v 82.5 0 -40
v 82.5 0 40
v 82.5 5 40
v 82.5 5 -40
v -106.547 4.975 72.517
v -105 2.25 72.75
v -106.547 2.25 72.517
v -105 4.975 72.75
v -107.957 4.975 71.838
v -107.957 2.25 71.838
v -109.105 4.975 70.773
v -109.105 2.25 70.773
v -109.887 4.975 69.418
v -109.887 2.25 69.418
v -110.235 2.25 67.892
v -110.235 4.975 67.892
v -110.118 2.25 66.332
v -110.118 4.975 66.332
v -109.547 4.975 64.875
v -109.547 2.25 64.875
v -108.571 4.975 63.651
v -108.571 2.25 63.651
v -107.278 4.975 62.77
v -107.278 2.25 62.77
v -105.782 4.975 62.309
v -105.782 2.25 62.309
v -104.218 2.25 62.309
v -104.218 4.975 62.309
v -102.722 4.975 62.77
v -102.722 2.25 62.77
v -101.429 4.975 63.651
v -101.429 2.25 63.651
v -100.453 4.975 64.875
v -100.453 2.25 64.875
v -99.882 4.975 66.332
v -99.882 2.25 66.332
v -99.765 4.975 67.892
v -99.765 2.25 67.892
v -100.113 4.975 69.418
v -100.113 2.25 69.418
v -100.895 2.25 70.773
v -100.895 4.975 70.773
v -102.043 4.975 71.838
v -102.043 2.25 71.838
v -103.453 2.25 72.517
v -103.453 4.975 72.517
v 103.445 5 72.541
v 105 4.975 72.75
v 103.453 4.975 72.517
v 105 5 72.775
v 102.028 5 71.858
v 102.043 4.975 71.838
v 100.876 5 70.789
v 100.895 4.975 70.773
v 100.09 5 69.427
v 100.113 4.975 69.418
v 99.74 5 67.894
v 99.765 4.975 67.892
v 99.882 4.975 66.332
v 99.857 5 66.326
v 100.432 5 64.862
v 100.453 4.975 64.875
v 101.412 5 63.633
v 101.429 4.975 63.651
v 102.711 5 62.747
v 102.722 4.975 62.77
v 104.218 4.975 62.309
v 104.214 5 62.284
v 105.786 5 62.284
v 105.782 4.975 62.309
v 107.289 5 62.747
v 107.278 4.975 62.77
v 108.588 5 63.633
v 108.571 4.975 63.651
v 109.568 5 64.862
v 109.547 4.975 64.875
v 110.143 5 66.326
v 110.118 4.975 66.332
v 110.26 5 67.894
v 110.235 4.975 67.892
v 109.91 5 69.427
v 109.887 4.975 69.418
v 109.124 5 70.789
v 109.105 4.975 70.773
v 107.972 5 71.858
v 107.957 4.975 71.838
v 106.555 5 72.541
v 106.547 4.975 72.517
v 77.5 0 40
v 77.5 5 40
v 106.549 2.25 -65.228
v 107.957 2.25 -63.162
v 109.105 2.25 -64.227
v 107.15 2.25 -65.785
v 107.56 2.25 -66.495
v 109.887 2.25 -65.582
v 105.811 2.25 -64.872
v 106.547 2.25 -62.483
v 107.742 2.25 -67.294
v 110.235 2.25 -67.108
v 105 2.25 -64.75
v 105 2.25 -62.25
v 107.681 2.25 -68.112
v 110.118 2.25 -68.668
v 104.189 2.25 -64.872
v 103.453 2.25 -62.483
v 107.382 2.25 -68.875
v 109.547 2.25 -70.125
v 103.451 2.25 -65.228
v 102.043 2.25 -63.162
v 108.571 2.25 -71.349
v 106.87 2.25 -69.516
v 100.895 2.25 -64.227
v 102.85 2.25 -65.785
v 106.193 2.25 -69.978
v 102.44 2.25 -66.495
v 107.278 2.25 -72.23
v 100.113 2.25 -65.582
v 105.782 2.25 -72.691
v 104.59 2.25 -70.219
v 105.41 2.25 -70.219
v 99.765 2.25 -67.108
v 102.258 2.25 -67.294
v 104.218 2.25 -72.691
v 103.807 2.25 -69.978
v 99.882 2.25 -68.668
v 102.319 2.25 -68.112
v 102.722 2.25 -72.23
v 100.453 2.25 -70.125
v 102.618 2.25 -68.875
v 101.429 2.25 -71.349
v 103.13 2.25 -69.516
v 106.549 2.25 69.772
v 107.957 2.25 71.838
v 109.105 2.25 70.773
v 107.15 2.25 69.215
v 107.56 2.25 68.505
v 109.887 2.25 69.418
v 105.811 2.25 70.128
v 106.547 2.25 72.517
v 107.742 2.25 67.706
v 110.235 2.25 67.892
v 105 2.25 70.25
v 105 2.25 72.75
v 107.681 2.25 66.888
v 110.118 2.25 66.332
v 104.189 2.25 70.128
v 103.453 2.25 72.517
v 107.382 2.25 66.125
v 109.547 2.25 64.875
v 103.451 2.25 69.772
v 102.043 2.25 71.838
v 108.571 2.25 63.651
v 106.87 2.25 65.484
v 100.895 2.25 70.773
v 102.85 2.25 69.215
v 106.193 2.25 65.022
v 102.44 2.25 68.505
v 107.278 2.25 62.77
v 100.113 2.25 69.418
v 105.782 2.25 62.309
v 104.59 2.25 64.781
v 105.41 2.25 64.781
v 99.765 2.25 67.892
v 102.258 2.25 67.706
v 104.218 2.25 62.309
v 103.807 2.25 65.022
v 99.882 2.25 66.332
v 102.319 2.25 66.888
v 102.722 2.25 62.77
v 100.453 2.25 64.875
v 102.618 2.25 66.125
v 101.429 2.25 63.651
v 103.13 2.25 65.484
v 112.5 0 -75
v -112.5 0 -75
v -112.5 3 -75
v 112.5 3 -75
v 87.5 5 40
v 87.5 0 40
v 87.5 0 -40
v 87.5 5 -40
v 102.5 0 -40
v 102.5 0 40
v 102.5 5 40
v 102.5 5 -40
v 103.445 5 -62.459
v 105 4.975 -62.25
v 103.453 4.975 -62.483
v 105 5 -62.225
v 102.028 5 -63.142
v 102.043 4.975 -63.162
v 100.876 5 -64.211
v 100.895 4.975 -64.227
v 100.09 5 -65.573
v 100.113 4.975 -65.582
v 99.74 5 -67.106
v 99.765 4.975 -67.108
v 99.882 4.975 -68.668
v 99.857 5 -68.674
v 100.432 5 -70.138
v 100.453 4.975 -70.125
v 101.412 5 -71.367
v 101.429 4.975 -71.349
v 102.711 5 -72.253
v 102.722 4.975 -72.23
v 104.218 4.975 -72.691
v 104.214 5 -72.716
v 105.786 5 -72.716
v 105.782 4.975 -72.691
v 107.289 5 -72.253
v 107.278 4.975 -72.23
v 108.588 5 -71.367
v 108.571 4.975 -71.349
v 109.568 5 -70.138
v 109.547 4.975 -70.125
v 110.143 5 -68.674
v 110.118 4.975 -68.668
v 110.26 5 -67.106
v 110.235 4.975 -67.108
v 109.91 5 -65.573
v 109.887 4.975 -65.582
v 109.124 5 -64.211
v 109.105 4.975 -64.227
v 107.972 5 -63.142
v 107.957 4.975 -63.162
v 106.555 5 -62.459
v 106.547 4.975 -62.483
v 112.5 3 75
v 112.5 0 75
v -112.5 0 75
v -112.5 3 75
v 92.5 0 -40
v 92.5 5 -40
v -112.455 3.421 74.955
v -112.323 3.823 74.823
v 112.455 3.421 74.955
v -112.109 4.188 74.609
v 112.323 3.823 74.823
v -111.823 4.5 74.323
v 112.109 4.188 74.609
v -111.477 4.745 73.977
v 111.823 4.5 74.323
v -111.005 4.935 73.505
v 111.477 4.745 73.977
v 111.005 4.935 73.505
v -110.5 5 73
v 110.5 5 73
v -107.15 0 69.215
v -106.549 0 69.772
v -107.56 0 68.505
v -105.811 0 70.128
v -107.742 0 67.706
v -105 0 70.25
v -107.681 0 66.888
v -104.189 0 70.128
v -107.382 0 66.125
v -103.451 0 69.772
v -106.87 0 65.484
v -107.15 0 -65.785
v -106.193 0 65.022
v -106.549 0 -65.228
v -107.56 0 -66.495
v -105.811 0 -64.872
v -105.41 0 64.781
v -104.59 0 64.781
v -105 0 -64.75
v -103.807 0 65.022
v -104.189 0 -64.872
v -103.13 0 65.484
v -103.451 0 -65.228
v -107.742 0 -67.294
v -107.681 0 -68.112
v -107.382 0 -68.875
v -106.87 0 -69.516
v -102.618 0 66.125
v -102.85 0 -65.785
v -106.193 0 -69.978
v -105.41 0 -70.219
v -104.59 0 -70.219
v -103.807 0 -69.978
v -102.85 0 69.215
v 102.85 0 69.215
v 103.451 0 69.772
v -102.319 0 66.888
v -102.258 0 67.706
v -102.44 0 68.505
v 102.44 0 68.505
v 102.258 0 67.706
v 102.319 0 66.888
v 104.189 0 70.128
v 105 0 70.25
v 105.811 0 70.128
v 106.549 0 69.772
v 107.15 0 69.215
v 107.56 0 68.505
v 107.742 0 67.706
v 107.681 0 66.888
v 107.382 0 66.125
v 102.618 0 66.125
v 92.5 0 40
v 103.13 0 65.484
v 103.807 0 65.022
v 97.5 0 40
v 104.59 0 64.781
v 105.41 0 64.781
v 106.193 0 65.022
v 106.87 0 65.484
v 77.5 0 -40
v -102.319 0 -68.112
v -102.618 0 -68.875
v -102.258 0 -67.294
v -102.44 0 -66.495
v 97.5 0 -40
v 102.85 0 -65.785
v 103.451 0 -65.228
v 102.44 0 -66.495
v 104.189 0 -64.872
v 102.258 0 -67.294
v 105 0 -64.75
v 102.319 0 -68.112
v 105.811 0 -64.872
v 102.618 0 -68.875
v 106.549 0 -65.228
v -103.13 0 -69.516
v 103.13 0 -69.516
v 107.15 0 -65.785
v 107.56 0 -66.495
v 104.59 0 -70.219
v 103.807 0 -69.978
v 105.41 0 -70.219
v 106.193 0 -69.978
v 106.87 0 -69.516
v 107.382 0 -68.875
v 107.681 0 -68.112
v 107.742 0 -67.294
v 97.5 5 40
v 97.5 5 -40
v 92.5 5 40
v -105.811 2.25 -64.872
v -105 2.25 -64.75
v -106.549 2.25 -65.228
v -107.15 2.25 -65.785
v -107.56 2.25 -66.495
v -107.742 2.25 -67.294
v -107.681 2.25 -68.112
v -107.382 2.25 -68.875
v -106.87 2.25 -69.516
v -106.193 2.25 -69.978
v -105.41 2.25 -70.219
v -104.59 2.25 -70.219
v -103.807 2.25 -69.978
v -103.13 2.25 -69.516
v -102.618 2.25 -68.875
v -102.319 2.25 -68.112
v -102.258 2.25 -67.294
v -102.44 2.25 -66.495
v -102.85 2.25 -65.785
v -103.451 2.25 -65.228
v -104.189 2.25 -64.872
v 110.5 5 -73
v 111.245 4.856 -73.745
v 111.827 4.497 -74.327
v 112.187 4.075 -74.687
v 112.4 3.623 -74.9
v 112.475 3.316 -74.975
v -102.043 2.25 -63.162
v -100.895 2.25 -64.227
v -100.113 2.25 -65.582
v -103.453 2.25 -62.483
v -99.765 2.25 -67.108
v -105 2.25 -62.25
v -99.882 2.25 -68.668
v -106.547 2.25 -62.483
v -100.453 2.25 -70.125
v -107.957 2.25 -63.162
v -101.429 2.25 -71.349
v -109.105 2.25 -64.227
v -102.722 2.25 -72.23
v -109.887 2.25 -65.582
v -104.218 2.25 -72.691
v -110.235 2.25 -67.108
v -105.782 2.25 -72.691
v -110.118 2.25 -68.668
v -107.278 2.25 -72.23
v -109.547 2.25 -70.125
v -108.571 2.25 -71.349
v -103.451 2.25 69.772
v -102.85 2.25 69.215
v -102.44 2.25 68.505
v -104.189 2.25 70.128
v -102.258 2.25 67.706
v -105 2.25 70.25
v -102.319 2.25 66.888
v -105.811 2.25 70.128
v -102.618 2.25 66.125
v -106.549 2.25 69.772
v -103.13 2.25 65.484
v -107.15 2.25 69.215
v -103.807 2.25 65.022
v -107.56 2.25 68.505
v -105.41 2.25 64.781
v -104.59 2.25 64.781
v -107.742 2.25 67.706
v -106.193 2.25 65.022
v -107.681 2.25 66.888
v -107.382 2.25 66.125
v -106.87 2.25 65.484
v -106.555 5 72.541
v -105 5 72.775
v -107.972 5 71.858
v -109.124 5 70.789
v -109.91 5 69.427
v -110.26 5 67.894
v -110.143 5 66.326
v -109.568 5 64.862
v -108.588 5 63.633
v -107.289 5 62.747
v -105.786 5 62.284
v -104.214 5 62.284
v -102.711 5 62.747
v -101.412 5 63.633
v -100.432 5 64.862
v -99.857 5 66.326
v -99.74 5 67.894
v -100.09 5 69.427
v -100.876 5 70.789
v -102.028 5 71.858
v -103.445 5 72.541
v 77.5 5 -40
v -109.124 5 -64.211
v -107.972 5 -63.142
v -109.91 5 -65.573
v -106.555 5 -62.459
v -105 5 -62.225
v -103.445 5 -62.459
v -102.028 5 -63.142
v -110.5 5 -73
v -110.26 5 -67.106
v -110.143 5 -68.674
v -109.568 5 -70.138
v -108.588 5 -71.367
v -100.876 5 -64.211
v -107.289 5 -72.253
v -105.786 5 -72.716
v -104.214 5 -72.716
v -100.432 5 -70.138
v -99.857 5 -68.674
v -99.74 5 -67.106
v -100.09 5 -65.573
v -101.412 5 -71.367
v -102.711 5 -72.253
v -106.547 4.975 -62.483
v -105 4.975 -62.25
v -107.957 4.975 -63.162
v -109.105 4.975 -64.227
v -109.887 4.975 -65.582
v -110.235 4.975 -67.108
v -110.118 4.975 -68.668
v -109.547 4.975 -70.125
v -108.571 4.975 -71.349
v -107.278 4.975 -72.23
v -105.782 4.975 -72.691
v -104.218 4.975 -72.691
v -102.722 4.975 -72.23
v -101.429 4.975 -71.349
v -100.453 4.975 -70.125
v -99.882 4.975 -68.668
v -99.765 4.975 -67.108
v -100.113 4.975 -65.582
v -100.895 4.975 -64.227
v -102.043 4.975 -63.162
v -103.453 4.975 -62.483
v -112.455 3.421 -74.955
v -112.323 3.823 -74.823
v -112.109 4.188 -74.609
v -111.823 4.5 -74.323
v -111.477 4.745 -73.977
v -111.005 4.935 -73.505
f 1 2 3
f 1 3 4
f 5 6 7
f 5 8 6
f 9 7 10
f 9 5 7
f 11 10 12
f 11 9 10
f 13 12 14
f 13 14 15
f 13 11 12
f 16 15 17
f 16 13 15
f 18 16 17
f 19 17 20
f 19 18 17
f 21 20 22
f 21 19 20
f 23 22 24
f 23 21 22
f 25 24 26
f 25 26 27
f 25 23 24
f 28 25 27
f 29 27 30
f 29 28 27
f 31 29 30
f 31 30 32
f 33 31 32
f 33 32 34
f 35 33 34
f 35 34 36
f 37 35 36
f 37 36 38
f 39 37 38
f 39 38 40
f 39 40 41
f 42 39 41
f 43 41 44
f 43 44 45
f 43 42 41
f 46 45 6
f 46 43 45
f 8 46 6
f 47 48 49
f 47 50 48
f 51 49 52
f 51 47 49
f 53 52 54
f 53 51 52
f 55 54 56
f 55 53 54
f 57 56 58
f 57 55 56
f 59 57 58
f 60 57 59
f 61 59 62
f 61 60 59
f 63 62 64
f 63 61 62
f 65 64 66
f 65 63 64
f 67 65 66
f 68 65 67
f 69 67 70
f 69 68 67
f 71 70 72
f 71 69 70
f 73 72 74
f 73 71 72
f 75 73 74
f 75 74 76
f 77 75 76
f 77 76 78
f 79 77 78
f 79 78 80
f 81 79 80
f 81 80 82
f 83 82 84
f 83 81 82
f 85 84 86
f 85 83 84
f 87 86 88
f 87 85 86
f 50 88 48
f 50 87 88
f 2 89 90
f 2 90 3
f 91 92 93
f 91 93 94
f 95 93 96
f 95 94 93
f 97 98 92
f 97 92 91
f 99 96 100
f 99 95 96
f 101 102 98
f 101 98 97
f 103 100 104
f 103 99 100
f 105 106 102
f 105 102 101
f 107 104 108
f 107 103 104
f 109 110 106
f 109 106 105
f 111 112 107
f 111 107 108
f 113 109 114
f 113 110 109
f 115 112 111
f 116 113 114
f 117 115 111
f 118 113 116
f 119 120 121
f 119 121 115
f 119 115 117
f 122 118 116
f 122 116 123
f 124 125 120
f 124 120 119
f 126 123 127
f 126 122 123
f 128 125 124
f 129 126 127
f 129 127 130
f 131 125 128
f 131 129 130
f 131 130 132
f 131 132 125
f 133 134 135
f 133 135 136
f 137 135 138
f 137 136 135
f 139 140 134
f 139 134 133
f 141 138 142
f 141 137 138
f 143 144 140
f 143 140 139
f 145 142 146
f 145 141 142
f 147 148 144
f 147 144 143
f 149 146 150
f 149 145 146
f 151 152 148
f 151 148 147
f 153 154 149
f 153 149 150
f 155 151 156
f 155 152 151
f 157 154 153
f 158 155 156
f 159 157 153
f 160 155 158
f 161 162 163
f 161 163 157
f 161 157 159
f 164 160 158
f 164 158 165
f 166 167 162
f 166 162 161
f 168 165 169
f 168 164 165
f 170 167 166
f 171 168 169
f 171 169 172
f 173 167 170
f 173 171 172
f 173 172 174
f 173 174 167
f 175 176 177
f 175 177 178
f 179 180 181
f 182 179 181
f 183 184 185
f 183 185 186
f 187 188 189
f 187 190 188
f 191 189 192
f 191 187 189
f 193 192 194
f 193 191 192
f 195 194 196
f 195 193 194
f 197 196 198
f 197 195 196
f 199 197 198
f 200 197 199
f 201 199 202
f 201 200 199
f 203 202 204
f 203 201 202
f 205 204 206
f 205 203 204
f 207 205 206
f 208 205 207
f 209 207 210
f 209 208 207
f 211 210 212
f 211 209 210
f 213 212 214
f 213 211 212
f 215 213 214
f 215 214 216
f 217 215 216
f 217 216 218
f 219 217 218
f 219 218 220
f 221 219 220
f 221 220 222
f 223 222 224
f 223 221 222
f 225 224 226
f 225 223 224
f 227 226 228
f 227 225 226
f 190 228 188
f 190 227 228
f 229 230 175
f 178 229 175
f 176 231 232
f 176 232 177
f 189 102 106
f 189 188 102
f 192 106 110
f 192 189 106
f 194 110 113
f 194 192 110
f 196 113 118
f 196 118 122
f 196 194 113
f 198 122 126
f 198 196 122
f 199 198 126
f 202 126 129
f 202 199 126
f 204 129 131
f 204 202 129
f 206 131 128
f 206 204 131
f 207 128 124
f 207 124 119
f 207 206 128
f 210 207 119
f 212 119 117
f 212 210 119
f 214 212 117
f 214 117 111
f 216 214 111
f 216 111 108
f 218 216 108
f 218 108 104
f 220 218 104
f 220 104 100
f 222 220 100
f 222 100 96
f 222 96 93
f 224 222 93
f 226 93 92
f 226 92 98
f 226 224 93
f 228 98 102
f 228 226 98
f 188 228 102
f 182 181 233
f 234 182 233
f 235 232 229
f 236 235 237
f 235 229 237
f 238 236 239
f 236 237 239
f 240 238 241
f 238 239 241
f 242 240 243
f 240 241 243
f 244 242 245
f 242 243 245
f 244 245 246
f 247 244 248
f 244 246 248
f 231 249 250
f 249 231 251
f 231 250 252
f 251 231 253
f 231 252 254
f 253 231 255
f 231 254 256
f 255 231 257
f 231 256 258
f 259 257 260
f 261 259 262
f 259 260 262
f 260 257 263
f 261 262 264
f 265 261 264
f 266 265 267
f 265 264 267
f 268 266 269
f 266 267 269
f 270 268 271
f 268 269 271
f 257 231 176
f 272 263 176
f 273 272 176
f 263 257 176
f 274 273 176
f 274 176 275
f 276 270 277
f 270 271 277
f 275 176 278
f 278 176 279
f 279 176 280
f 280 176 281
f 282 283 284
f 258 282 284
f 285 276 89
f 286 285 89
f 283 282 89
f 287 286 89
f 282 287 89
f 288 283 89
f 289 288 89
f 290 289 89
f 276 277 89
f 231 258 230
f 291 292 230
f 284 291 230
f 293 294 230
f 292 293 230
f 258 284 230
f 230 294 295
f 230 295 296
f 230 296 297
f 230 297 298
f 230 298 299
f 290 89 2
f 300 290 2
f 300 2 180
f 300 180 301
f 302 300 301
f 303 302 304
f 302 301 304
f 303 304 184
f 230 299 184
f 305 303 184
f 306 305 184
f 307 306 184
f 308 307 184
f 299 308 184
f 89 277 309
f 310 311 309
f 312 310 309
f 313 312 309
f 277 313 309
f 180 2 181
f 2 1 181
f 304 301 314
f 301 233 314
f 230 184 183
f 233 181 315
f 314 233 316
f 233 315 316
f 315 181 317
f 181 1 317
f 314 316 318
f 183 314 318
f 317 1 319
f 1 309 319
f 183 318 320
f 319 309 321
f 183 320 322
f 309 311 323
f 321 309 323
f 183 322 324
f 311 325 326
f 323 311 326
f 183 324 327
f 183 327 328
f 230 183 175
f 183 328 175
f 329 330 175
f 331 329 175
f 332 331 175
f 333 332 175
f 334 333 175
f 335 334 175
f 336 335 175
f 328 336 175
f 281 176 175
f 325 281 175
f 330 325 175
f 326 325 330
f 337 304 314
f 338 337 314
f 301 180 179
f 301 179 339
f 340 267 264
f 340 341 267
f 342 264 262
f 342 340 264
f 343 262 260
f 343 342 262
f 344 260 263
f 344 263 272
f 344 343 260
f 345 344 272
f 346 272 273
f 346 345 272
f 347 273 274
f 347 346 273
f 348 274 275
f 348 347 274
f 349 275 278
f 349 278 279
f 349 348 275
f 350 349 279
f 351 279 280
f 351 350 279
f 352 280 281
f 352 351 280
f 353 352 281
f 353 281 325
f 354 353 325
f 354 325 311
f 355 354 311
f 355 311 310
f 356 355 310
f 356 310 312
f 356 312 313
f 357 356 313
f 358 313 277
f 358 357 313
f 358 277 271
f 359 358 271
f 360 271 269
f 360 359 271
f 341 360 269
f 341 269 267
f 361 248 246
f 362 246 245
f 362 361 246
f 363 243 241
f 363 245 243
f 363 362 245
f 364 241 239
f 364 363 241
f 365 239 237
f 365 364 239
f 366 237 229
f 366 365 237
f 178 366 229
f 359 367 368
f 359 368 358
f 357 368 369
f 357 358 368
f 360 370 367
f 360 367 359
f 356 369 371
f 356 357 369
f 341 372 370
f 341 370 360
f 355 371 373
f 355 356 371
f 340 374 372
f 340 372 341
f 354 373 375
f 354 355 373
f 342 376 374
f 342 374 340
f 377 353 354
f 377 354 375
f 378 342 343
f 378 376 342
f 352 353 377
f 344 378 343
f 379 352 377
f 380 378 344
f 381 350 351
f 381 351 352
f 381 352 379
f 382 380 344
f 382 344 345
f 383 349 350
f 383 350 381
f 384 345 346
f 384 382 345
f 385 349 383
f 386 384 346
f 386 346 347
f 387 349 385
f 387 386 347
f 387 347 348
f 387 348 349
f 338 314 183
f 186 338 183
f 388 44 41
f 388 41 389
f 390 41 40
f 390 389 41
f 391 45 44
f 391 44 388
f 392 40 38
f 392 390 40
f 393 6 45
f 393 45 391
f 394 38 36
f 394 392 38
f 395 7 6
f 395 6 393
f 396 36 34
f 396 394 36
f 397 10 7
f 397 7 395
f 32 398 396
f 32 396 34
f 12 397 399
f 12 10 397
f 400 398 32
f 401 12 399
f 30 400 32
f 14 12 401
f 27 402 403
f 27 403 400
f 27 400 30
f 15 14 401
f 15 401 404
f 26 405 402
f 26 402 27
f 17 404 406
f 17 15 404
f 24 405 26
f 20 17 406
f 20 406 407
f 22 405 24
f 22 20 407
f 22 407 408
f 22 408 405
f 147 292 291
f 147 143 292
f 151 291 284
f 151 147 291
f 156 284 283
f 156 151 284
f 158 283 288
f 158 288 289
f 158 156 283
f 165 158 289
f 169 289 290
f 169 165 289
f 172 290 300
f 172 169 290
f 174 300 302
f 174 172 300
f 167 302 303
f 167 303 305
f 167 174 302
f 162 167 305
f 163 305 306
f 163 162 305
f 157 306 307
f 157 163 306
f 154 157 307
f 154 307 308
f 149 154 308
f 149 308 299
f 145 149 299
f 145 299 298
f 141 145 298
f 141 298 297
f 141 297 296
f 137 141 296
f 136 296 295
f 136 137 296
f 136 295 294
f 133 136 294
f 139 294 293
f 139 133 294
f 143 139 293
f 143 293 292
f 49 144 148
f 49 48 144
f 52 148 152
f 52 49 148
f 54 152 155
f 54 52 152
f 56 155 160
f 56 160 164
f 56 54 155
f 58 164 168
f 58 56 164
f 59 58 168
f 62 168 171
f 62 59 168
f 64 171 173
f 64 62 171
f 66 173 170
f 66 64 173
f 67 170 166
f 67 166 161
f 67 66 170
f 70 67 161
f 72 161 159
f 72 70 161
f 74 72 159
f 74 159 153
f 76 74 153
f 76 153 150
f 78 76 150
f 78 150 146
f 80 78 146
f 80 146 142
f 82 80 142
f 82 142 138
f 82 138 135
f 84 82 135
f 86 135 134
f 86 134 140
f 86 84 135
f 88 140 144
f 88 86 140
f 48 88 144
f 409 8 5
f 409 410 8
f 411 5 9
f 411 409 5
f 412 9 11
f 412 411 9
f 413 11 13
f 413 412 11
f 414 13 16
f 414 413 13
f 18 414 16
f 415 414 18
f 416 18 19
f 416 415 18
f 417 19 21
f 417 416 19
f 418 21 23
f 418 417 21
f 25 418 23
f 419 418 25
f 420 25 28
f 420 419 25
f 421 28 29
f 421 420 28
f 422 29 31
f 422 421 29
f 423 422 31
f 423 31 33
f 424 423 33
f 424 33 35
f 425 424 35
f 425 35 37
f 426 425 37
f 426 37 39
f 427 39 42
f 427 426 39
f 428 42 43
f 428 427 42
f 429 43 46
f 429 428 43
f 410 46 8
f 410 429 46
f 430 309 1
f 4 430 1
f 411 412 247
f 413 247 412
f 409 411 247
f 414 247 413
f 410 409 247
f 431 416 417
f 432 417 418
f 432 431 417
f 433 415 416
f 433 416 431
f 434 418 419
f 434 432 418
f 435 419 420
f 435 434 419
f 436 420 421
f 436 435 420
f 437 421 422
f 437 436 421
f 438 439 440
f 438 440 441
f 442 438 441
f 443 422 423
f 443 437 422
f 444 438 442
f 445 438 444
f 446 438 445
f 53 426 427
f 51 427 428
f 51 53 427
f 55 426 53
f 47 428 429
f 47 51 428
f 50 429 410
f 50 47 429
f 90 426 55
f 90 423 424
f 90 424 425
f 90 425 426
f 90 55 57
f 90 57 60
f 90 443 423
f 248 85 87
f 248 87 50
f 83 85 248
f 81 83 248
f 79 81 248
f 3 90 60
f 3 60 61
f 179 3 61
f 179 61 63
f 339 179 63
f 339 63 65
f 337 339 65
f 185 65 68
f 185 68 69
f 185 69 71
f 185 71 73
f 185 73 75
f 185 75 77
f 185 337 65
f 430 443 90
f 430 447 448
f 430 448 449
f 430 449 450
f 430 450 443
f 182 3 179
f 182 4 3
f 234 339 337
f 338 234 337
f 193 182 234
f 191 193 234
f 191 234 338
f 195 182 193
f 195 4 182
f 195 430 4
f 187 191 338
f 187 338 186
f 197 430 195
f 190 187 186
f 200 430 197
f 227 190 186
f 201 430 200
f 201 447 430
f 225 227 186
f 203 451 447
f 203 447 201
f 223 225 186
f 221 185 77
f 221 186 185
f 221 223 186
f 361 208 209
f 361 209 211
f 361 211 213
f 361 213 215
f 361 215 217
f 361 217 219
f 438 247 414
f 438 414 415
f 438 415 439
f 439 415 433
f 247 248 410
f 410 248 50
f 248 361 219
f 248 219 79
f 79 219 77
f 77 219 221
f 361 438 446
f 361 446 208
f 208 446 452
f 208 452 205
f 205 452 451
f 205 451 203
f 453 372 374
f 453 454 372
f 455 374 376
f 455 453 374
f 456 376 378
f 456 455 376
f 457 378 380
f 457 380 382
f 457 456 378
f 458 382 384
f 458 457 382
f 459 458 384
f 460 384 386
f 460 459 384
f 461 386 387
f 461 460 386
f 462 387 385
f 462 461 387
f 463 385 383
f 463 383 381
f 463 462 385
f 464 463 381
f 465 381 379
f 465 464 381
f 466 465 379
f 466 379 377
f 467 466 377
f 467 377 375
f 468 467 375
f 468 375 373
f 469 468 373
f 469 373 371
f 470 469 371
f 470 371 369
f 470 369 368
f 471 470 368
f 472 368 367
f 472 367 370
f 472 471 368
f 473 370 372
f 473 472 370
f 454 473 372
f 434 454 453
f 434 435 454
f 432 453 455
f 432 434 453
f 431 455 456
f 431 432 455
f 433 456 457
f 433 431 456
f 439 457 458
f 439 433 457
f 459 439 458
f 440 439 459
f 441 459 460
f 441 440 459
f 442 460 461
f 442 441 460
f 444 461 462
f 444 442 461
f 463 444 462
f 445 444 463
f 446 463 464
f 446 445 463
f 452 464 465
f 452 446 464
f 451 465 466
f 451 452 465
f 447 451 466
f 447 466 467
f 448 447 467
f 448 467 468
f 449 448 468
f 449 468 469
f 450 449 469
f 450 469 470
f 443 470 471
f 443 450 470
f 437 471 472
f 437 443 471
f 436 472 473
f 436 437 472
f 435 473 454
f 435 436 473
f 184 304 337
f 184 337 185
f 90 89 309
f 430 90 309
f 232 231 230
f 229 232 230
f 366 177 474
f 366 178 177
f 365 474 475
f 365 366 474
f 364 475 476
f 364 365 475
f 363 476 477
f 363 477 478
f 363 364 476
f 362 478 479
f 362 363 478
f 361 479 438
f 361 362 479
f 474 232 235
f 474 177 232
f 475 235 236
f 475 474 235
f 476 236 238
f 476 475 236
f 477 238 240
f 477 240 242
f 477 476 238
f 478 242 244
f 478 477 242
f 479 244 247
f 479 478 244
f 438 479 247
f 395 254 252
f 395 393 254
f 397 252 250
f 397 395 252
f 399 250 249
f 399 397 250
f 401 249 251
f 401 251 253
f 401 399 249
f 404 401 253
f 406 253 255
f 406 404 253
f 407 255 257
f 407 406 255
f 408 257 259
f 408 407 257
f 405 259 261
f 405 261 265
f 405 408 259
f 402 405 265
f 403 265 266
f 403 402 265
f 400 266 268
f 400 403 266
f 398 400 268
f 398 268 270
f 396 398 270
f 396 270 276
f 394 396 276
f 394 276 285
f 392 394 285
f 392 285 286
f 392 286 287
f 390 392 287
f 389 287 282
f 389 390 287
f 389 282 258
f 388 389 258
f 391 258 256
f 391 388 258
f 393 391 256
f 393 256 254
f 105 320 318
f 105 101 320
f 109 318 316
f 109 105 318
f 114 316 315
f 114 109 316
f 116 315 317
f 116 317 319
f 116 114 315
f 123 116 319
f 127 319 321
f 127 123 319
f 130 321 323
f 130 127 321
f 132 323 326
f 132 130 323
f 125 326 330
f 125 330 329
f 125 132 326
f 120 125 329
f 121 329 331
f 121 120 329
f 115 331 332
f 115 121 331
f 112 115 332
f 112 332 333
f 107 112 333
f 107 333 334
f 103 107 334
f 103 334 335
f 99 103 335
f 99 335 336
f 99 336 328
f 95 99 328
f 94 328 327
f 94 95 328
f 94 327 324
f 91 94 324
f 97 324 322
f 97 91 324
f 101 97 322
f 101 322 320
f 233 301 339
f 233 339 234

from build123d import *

# Parameters (mm, degrees)
SKETCH1_W                      = 225
SKETCH1_H                      = 150
SKETCH1_W_2                    = 5
SKETCH1_H_2                    = 80
BOSS_EXTRUDE1_DEPTH            = 5
CBORE_FOR_M5_SBHCS1_AT_2_COUNT = 2
CBORE_FOR_M5_SBHCS1_AT_2_PITCH = 210
CBORE_FOR_M5_SBHCS1_AT_3_COUNT = 2
CBORE_FOR_M5_SBHCS1_AT_3_PITCH = 135
CBORE_FOR_M5_SBHCS1_AT_4_COUNT = 2
CBORE_FOR_M5_SBHCS1_AT_4_PITCH = 249.649754656
FILLET1_R                      = 2


with BuildPart() as part:
    # Sketch1 → Boss-Extrude1 (new body)
    with BuildSketch(Plane(origin=(0, 0, 0), x_dir=(1, 0, 0), z_dir=(0, 1, 0))):
        Rectangle(SKETCH1_W, SKETCH1_H)
        with Locations((100, 0)):
            Rectangle(SKETCH1_W_2, SKETCH1_H_2, mode=Mode.SUBTRACT)
        with Locations((90, 0)):
            Rectangle(SKETCH1_W_2, SKETCH1_H_2, mode=Mode.SUBTRACT)
        with Locations((80, 0)):
            Rectangle(SKETCH1_W_2, SKETCH1_H_2, mode=Mode.SUBTRACT)
    extrude(amount=BOSS_EXTRUDE1_DEPTH)

    # Sketch3 → CBORE for M5 SBHCS1 (revolve, cut)
    with BuildSketch(Plane(origin=(-105, 5, -67.5), x_dir=(0, 0, 1), z_dir=(1, 0, 0))):
        Polygon((0, 0), (0, 5), (2.75, 5), (2.75, 2.75), (5.25, 2.75), (5.25, 0.025), (5.275, 0), align=None)
    cbore_for_m5_sbhcs1 = revolve(axis=Axis((-105, 11.35, -67.5), (0, -1, 0)), mode=Mode.SUBTRACT)

    # CBORE for M5 SBHCS1 at 2: CBORE for M5 SBHCS1 ×2
    with Locations(*[(i * CBORE_FOR_M5_SBHCS1_AT_2_PITCH, 0, 0) for i in range(1, CBORE_FOR_M5_SBHCS1_AT_2_COUNT)]):
        add(cbore_for_m5_sbhcs1, mode=Mode.SUBTRACT)

    # CBORE for M5 SBHCS1 at 3: CBORE for M5 SBHCS1 ×2
    with Locations(*[(0, 0, i * CBORE_FOR_M5_SBHCS1_AT_3_PITCH) for i in range(1, CBORE_FOR_M5_SBHCS1_AT_3_COUNT)]):
        add(cbore_for_m5_sbhcs1, mode=Mode.SUBTRACT)

    # CBORE for M5 SBHCS1 at 4: CBORE for M5 SBHCS1 ×2
    with Locations(*[Vector(0.8411784753765537, 0, 0.5407575913134988) * (i * CBORE_FOR_M5_SBHCS1_AT_4_PITCH) for i in range(1, CBORE_FOR_M5_SBHCS1_AT_4_COUNT)]):
        add(cbore_for_m5_sbhcs1, mode=Mode.SUBTRACT)

    # Fillet1
    fillet1_edges = [part.edges().sort_by_distance(p)[0] for p in [
        (-112.5, 5, 0),
        (0, 5, 75),
        (112.5, 5, 0),
        (0, 5, -75),
    ]]
    fillet(fillet1_edges, radius=FILLET1_R)


solid = part.part
